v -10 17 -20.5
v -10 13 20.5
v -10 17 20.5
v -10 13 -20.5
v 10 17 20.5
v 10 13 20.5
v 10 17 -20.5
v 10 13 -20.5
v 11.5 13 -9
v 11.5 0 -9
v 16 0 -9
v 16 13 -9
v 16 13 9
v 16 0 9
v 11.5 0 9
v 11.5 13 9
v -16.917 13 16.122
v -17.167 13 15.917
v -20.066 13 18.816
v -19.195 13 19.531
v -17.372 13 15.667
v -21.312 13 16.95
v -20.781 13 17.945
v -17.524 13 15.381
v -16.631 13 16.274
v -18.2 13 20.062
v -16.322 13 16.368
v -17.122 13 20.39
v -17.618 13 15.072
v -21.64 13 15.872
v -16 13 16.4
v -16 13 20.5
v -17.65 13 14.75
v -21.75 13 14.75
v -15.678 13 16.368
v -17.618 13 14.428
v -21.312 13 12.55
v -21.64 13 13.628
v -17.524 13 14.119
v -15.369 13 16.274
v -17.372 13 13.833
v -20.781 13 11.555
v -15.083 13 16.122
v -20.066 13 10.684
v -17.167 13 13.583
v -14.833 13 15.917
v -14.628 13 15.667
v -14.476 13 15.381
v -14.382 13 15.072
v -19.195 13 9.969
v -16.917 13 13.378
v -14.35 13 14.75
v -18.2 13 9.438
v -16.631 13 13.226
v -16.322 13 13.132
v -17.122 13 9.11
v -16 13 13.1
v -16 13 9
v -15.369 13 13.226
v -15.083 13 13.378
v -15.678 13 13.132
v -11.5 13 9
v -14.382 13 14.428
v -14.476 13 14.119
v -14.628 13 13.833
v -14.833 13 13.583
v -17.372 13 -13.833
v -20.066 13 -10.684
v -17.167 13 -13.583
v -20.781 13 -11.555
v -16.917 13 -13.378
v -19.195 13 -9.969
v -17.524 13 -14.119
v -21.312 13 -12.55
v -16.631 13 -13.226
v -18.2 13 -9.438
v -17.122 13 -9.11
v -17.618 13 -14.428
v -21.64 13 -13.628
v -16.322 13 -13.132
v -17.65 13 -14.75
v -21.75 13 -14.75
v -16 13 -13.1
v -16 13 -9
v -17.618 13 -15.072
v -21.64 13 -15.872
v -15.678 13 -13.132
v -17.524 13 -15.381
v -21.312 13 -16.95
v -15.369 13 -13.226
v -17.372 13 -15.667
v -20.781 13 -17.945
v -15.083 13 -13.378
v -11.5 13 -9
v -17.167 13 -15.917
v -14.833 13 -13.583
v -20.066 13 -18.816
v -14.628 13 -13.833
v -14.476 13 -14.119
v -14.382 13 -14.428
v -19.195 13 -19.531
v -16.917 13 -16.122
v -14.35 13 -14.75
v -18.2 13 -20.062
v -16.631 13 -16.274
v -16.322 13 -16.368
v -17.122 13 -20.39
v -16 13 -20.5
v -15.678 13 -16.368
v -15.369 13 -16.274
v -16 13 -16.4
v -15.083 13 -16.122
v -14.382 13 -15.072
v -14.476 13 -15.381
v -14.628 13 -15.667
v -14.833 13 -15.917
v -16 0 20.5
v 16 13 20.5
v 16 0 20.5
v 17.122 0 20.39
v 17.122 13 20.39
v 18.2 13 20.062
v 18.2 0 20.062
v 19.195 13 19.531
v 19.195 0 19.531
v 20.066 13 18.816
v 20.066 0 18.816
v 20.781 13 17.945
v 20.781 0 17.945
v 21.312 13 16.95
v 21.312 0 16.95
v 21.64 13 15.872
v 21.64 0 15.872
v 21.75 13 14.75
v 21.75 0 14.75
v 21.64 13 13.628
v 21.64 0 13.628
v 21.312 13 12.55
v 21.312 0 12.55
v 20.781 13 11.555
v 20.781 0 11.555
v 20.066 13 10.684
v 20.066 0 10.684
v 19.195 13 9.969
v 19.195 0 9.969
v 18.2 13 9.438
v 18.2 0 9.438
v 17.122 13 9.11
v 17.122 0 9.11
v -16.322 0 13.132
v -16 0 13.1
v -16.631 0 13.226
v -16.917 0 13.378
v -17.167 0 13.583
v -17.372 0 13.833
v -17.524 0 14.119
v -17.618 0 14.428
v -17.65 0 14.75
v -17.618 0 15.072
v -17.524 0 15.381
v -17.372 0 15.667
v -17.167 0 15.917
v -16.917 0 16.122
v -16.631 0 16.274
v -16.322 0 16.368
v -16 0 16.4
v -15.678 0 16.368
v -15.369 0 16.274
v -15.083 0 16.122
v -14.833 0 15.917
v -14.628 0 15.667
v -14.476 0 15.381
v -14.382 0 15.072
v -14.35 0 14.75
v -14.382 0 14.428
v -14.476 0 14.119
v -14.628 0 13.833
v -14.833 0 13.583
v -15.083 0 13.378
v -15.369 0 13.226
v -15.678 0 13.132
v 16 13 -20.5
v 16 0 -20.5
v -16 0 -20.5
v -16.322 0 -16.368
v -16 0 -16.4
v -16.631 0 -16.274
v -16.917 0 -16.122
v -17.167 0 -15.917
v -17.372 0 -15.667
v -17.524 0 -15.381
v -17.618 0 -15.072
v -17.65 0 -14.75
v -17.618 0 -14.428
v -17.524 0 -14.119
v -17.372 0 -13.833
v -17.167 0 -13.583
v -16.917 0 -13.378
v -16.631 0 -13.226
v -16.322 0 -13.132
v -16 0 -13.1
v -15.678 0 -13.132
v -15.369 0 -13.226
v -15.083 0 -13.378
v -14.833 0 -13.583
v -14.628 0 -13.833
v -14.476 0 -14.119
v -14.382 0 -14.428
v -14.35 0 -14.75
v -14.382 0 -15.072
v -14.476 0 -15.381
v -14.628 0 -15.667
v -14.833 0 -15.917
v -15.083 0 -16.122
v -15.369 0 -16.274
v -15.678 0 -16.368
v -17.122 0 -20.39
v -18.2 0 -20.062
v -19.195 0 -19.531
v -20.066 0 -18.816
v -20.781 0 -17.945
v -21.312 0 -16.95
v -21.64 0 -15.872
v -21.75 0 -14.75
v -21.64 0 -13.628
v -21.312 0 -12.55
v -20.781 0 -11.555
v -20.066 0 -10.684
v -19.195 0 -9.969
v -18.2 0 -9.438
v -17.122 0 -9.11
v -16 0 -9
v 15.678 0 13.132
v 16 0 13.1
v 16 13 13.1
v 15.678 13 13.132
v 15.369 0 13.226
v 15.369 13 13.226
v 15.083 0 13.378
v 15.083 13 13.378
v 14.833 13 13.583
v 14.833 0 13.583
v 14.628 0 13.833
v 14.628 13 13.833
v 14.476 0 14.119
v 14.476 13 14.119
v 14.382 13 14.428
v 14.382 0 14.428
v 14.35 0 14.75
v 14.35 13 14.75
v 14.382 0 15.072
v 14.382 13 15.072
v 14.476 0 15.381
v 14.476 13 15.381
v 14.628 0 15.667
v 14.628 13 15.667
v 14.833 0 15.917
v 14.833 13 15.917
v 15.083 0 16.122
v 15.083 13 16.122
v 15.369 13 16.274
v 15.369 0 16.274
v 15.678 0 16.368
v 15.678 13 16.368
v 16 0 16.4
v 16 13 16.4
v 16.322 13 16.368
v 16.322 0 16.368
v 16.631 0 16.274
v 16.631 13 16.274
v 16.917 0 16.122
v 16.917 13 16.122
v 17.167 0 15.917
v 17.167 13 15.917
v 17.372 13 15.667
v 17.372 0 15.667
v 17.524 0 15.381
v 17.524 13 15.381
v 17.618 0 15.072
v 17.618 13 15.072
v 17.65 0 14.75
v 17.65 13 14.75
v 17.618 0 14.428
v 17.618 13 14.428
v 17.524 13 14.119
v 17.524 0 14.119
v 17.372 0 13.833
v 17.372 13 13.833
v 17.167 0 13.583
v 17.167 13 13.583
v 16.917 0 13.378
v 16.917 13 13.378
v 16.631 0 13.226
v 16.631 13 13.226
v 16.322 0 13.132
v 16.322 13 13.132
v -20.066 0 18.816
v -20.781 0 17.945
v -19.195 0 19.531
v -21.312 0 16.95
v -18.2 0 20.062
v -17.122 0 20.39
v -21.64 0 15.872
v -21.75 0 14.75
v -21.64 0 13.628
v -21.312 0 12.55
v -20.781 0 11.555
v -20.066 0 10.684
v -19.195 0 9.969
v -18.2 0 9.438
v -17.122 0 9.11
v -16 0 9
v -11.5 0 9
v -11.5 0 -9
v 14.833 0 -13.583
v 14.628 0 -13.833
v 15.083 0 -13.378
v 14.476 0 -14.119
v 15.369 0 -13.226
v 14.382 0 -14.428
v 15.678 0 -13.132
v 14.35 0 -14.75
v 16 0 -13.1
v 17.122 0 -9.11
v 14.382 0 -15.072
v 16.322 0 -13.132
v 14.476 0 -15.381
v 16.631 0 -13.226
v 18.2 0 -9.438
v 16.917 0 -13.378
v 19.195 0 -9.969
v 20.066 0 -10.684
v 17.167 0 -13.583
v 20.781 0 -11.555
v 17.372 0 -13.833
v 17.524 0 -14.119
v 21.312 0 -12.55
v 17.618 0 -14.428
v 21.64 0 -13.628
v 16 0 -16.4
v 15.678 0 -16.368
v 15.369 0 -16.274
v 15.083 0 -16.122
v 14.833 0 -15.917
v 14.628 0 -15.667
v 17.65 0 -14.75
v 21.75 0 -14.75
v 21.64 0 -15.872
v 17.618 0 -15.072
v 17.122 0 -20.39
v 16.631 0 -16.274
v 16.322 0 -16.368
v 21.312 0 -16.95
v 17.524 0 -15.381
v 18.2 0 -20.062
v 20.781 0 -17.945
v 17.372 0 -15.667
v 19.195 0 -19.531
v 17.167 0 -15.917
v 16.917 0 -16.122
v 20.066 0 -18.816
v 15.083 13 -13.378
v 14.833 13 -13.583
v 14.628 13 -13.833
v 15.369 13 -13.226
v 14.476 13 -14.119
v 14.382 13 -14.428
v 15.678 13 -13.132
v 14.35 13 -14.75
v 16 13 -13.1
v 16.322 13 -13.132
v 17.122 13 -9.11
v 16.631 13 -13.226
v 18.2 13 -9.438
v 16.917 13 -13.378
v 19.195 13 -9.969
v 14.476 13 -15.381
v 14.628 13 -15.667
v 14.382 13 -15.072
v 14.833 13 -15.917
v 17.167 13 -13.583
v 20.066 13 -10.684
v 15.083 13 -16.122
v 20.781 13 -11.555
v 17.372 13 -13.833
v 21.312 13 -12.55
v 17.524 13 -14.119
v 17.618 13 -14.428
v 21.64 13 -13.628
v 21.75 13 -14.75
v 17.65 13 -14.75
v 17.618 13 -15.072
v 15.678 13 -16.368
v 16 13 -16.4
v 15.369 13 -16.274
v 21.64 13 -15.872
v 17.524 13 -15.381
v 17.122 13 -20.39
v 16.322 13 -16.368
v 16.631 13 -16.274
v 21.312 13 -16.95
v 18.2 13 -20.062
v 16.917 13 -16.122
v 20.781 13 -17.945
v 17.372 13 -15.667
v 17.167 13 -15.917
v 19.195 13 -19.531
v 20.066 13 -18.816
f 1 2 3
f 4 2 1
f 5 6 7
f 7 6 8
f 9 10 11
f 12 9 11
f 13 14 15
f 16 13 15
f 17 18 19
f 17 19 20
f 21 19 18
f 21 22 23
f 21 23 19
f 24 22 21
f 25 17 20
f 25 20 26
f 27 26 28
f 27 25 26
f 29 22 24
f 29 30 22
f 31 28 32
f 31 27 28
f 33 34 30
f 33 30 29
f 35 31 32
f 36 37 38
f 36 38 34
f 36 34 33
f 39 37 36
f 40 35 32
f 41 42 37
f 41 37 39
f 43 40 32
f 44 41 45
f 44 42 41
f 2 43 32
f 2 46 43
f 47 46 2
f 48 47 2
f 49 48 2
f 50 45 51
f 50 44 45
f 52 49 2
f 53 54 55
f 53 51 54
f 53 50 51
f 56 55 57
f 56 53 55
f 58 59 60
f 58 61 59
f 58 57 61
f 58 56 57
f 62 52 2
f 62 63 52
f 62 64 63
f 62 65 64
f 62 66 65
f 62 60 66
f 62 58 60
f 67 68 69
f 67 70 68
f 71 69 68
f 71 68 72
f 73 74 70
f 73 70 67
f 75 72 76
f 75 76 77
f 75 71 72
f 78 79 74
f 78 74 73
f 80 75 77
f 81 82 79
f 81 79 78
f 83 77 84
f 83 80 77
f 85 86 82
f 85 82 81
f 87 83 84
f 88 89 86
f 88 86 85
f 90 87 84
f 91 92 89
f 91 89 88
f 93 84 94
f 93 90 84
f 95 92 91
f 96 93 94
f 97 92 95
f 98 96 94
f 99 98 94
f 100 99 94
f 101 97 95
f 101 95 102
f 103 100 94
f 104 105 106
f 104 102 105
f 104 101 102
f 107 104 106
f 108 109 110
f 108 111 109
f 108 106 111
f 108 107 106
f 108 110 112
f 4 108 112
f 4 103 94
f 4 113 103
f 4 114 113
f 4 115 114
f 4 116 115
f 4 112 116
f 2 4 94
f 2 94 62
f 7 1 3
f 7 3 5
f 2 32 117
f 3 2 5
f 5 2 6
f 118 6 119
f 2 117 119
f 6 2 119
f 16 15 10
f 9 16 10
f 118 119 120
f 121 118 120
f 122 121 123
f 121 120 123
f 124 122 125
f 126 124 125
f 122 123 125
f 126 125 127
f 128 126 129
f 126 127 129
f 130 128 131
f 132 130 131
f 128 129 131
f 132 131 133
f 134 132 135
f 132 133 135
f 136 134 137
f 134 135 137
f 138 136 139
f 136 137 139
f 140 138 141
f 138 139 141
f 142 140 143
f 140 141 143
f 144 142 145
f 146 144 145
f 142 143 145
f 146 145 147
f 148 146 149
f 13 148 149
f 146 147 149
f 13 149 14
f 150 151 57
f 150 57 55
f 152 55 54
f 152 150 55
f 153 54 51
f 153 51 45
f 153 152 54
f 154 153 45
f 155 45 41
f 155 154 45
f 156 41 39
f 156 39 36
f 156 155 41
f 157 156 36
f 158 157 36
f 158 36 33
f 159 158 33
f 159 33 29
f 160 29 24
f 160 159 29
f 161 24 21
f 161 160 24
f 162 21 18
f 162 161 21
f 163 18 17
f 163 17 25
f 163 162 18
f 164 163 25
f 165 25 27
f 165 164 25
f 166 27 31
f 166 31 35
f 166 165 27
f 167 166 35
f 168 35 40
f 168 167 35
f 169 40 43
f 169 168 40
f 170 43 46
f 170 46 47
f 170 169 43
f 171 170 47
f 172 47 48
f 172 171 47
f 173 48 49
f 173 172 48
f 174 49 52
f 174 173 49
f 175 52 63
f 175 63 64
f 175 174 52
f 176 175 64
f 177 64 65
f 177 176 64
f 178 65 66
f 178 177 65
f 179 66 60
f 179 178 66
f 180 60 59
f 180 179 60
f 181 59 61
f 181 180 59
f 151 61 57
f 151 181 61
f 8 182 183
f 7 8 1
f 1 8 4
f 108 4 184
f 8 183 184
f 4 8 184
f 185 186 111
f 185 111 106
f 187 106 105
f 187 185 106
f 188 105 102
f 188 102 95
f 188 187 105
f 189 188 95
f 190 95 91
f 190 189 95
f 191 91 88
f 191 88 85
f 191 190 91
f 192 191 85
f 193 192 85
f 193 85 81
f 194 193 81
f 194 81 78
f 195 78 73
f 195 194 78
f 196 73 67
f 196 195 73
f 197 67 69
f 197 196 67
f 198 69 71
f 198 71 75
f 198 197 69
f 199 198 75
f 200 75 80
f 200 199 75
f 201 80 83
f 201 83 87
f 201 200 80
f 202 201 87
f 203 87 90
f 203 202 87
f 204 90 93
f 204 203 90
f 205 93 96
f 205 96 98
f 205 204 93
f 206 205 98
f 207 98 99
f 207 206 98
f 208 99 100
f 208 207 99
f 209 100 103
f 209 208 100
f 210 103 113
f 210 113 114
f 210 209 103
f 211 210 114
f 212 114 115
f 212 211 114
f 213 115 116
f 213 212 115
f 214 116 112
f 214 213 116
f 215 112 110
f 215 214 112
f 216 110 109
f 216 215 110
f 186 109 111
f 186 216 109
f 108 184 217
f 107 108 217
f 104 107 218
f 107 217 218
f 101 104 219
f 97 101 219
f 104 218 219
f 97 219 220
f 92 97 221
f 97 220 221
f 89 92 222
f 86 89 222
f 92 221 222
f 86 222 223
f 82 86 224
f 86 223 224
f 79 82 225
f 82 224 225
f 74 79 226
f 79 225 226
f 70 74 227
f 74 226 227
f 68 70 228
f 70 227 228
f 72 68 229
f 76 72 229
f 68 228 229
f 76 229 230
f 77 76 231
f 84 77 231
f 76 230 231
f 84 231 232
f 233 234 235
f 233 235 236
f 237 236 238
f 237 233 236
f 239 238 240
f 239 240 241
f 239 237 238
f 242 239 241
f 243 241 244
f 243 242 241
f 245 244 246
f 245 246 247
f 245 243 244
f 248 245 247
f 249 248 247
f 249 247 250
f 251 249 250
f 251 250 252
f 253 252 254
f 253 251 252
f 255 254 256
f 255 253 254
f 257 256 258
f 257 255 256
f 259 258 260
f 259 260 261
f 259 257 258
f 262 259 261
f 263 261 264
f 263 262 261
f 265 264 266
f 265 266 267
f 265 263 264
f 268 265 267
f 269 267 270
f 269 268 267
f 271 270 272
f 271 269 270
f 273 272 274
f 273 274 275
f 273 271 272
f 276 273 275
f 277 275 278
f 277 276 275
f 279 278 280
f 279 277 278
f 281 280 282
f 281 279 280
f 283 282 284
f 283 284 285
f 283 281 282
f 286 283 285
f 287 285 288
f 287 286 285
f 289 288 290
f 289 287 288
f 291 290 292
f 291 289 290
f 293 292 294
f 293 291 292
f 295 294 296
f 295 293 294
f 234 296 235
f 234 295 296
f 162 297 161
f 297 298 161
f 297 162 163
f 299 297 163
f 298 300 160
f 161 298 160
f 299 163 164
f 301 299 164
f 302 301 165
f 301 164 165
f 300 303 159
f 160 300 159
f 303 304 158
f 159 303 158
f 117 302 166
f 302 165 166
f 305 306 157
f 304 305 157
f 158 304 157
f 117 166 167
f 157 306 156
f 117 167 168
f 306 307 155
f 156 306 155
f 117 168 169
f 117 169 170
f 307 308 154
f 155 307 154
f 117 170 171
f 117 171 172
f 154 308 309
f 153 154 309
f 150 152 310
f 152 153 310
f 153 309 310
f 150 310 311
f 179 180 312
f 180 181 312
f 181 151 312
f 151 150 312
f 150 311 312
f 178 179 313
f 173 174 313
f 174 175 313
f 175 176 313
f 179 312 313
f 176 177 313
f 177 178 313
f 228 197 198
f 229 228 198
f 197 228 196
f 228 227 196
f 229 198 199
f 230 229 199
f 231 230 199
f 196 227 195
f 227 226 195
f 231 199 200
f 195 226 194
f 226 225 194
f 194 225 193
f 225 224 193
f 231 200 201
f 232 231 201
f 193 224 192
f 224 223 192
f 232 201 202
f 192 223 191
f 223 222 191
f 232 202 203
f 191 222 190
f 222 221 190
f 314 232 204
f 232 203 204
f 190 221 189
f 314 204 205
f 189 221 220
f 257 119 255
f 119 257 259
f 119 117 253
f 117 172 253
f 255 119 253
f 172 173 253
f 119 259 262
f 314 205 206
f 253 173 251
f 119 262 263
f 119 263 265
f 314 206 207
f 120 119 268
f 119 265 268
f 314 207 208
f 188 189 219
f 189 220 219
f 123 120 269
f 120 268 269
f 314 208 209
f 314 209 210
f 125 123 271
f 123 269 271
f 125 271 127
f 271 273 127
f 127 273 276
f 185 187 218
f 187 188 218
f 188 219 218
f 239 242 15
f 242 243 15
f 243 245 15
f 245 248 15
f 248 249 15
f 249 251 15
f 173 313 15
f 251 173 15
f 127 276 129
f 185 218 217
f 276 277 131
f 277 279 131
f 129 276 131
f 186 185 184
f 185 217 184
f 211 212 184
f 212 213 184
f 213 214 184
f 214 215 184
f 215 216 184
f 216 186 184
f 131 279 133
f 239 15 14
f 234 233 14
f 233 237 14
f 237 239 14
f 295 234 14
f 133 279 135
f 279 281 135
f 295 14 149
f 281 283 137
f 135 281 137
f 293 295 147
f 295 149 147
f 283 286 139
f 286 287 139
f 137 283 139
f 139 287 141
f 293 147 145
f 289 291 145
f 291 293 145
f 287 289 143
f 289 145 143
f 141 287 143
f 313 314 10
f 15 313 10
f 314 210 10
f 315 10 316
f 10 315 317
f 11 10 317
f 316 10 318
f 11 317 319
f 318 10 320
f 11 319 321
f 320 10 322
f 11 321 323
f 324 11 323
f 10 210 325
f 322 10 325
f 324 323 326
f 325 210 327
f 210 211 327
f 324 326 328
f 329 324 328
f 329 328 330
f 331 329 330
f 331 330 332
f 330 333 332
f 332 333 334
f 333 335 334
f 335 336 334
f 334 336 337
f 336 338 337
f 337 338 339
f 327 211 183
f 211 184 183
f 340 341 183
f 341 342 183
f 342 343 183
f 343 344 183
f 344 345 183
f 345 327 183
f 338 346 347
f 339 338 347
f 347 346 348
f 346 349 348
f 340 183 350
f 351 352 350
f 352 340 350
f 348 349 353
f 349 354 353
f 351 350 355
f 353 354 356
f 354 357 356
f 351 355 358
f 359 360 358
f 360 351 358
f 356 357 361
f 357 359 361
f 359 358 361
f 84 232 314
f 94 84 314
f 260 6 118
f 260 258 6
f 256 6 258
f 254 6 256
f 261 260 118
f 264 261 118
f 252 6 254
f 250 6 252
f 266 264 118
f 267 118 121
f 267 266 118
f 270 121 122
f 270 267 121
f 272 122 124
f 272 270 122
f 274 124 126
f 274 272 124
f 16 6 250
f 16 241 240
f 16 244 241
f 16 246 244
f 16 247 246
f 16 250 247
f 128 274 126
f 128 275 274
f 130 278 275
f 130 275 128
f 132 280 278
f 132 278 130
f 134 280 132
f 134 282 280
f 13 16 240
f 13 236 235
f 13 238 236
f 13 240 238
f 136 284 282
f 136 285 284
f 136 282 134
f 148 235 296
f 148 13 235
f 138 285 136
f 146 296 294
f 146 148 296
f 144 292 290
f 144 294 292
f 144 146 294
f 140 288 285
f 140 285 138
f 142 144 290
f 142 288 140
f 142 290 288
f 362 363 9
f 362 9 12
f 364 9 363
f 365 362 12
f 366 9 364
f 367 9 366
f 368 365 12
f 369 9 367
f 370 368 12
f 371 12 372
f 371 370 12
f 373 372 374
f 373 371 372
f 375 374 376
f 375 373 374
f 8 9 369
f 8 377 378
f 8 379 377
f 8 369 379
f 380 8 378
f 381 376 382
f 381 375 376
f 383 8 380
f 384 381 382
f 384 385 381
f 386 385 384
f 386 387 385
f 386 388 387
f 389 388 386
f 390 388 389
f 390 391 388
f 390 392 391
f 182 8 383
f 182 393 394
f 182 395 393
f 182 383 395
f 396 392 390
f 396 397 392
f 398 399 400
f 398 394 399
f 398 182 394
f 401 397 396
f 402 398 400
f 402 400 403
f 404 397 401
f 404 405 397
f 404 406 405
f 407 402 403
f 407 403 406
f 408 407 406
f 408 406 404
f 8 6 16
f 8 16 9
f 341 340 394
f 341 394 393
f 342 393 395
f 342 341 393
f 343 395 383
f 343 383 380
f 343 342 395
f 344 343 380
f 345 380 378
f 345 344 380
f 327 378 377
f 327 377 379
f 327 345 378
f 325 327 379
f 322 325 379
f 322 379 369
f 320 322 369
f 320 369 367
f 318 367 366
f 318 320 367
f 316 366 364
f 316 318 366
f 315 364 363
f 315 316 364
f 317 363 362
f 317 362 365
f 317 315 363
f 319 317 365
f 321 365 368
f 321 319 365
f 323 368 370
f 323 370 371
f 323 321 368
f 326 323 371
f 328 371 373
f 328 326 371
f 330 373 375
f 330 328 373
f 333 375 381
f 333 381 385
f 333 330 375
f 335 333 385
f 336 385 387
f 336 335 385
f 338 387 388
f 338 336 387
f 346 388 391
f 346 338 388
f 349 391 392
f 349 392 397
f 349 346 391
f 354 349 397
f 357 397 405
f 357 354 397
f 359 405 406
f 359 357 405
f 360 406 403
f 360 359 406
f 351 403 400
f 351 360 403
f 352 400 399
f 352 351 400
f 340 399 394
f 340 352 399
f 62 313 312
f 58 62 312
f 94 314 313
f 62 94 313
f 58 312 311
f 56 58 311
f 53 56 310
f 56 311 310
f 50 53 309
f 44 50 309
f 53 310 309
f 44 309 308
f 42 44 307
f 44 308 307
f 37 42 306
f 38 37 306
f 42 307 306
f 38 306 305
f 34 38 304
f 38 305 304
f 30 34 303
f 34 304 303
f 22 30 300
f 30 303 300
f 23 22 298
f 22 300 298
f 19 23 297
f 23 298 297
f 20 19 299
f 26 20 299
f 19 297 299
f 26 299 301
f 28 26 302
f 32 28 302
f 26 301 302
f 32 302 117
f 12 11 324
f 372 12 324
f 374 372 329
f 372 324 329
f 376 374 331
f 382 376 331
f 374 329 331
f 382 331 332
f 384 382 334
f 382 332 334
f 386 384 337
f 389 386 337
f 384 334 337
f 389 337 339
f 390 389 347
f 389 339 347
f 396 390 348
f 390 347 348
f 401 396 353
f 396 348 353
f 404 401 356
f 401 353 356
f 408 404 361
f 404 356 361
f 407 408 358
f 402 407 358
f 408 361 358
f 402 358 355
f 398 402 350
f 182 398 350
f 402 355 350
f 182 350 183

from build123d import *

# Parameters (mm, degrees)
SKETCH1_R           = 1.65
BOSS_EXTRUDE1_DEPTH = 13
SKETCH2_W           = 20
SKETCH2_H           = 41
BOSS_EXTRUDE2_DEPTH = 4


with BuildPart() as part:
    # Sketch1 → Boss-Extrude1 (new body)
    with BuildSketch(Plane(origin=(0, 0, 0), x_dir=(1, 0, 0), z_dir=(0, 1, 0))):
        with BuildLine():
            Line((-16, 9), (-11.5, 9))
            Line((-11.5, 9), (-11.5, -9))
            Line((-11.5, -9), (-16, -9))
            ThreePointArc((-16, -9), (-21.75, -14.75), (-16, -20.5))
            Line((-16, -20.5), (16, -20.5))
            ThreePointArc((16, -20.5), (21.75, -14.75), (16, -9))
            Line((16, -9), (11.5, -9))
            Line((11.5, -9), (11.5, 9))
            Line((11.5, 9), (16, 9))
            ThreePointArc((16, 9), (21.75, 14.75), (16, 20.5))
            Line((16, 20.5), (-16, 20.5))
            ThreePointArc((-16, 20.5), (-21.75, 14.75), (-16, 9))
        make_face()
        with Locations(Location((-16, 14.75, 0), (0, 0, 90))):
            Circle(SKETCH1_R, mode=Mode.SUBTRACT)
        with Locations(Location((16, 14.75, 0), (0, 0, 90))):
            Circle(SKETCH1_R, mode=Mode.SUBTRACT)
        with Locations(Location((16, -14.75, 0), (0, 0, 90))):
            Circle(SKETCH1_R, mode=Mode.SUBTRACT)
        with Locations(Location((-16, -14.75, 0), (0, 0, 90))):
            Circle(SKETCH1_R, mode=Mode.SUBTRACT)
    extrude(amount=BOSS_EXTRUDE1_DEPTH)

    # Sketch2 → Boss-Extrude2 (add)
    with BuildSketch(Plane(origin=(0, 13, 0), x_dir=(1, 0, 0), z_dir=(0, 1, 0))):
        Rectangle(SKETCH2_W, SKETCH2_H)
    extrude(amount=BOSS_EXTRUDE2_DEPTH)


solid = part.part
